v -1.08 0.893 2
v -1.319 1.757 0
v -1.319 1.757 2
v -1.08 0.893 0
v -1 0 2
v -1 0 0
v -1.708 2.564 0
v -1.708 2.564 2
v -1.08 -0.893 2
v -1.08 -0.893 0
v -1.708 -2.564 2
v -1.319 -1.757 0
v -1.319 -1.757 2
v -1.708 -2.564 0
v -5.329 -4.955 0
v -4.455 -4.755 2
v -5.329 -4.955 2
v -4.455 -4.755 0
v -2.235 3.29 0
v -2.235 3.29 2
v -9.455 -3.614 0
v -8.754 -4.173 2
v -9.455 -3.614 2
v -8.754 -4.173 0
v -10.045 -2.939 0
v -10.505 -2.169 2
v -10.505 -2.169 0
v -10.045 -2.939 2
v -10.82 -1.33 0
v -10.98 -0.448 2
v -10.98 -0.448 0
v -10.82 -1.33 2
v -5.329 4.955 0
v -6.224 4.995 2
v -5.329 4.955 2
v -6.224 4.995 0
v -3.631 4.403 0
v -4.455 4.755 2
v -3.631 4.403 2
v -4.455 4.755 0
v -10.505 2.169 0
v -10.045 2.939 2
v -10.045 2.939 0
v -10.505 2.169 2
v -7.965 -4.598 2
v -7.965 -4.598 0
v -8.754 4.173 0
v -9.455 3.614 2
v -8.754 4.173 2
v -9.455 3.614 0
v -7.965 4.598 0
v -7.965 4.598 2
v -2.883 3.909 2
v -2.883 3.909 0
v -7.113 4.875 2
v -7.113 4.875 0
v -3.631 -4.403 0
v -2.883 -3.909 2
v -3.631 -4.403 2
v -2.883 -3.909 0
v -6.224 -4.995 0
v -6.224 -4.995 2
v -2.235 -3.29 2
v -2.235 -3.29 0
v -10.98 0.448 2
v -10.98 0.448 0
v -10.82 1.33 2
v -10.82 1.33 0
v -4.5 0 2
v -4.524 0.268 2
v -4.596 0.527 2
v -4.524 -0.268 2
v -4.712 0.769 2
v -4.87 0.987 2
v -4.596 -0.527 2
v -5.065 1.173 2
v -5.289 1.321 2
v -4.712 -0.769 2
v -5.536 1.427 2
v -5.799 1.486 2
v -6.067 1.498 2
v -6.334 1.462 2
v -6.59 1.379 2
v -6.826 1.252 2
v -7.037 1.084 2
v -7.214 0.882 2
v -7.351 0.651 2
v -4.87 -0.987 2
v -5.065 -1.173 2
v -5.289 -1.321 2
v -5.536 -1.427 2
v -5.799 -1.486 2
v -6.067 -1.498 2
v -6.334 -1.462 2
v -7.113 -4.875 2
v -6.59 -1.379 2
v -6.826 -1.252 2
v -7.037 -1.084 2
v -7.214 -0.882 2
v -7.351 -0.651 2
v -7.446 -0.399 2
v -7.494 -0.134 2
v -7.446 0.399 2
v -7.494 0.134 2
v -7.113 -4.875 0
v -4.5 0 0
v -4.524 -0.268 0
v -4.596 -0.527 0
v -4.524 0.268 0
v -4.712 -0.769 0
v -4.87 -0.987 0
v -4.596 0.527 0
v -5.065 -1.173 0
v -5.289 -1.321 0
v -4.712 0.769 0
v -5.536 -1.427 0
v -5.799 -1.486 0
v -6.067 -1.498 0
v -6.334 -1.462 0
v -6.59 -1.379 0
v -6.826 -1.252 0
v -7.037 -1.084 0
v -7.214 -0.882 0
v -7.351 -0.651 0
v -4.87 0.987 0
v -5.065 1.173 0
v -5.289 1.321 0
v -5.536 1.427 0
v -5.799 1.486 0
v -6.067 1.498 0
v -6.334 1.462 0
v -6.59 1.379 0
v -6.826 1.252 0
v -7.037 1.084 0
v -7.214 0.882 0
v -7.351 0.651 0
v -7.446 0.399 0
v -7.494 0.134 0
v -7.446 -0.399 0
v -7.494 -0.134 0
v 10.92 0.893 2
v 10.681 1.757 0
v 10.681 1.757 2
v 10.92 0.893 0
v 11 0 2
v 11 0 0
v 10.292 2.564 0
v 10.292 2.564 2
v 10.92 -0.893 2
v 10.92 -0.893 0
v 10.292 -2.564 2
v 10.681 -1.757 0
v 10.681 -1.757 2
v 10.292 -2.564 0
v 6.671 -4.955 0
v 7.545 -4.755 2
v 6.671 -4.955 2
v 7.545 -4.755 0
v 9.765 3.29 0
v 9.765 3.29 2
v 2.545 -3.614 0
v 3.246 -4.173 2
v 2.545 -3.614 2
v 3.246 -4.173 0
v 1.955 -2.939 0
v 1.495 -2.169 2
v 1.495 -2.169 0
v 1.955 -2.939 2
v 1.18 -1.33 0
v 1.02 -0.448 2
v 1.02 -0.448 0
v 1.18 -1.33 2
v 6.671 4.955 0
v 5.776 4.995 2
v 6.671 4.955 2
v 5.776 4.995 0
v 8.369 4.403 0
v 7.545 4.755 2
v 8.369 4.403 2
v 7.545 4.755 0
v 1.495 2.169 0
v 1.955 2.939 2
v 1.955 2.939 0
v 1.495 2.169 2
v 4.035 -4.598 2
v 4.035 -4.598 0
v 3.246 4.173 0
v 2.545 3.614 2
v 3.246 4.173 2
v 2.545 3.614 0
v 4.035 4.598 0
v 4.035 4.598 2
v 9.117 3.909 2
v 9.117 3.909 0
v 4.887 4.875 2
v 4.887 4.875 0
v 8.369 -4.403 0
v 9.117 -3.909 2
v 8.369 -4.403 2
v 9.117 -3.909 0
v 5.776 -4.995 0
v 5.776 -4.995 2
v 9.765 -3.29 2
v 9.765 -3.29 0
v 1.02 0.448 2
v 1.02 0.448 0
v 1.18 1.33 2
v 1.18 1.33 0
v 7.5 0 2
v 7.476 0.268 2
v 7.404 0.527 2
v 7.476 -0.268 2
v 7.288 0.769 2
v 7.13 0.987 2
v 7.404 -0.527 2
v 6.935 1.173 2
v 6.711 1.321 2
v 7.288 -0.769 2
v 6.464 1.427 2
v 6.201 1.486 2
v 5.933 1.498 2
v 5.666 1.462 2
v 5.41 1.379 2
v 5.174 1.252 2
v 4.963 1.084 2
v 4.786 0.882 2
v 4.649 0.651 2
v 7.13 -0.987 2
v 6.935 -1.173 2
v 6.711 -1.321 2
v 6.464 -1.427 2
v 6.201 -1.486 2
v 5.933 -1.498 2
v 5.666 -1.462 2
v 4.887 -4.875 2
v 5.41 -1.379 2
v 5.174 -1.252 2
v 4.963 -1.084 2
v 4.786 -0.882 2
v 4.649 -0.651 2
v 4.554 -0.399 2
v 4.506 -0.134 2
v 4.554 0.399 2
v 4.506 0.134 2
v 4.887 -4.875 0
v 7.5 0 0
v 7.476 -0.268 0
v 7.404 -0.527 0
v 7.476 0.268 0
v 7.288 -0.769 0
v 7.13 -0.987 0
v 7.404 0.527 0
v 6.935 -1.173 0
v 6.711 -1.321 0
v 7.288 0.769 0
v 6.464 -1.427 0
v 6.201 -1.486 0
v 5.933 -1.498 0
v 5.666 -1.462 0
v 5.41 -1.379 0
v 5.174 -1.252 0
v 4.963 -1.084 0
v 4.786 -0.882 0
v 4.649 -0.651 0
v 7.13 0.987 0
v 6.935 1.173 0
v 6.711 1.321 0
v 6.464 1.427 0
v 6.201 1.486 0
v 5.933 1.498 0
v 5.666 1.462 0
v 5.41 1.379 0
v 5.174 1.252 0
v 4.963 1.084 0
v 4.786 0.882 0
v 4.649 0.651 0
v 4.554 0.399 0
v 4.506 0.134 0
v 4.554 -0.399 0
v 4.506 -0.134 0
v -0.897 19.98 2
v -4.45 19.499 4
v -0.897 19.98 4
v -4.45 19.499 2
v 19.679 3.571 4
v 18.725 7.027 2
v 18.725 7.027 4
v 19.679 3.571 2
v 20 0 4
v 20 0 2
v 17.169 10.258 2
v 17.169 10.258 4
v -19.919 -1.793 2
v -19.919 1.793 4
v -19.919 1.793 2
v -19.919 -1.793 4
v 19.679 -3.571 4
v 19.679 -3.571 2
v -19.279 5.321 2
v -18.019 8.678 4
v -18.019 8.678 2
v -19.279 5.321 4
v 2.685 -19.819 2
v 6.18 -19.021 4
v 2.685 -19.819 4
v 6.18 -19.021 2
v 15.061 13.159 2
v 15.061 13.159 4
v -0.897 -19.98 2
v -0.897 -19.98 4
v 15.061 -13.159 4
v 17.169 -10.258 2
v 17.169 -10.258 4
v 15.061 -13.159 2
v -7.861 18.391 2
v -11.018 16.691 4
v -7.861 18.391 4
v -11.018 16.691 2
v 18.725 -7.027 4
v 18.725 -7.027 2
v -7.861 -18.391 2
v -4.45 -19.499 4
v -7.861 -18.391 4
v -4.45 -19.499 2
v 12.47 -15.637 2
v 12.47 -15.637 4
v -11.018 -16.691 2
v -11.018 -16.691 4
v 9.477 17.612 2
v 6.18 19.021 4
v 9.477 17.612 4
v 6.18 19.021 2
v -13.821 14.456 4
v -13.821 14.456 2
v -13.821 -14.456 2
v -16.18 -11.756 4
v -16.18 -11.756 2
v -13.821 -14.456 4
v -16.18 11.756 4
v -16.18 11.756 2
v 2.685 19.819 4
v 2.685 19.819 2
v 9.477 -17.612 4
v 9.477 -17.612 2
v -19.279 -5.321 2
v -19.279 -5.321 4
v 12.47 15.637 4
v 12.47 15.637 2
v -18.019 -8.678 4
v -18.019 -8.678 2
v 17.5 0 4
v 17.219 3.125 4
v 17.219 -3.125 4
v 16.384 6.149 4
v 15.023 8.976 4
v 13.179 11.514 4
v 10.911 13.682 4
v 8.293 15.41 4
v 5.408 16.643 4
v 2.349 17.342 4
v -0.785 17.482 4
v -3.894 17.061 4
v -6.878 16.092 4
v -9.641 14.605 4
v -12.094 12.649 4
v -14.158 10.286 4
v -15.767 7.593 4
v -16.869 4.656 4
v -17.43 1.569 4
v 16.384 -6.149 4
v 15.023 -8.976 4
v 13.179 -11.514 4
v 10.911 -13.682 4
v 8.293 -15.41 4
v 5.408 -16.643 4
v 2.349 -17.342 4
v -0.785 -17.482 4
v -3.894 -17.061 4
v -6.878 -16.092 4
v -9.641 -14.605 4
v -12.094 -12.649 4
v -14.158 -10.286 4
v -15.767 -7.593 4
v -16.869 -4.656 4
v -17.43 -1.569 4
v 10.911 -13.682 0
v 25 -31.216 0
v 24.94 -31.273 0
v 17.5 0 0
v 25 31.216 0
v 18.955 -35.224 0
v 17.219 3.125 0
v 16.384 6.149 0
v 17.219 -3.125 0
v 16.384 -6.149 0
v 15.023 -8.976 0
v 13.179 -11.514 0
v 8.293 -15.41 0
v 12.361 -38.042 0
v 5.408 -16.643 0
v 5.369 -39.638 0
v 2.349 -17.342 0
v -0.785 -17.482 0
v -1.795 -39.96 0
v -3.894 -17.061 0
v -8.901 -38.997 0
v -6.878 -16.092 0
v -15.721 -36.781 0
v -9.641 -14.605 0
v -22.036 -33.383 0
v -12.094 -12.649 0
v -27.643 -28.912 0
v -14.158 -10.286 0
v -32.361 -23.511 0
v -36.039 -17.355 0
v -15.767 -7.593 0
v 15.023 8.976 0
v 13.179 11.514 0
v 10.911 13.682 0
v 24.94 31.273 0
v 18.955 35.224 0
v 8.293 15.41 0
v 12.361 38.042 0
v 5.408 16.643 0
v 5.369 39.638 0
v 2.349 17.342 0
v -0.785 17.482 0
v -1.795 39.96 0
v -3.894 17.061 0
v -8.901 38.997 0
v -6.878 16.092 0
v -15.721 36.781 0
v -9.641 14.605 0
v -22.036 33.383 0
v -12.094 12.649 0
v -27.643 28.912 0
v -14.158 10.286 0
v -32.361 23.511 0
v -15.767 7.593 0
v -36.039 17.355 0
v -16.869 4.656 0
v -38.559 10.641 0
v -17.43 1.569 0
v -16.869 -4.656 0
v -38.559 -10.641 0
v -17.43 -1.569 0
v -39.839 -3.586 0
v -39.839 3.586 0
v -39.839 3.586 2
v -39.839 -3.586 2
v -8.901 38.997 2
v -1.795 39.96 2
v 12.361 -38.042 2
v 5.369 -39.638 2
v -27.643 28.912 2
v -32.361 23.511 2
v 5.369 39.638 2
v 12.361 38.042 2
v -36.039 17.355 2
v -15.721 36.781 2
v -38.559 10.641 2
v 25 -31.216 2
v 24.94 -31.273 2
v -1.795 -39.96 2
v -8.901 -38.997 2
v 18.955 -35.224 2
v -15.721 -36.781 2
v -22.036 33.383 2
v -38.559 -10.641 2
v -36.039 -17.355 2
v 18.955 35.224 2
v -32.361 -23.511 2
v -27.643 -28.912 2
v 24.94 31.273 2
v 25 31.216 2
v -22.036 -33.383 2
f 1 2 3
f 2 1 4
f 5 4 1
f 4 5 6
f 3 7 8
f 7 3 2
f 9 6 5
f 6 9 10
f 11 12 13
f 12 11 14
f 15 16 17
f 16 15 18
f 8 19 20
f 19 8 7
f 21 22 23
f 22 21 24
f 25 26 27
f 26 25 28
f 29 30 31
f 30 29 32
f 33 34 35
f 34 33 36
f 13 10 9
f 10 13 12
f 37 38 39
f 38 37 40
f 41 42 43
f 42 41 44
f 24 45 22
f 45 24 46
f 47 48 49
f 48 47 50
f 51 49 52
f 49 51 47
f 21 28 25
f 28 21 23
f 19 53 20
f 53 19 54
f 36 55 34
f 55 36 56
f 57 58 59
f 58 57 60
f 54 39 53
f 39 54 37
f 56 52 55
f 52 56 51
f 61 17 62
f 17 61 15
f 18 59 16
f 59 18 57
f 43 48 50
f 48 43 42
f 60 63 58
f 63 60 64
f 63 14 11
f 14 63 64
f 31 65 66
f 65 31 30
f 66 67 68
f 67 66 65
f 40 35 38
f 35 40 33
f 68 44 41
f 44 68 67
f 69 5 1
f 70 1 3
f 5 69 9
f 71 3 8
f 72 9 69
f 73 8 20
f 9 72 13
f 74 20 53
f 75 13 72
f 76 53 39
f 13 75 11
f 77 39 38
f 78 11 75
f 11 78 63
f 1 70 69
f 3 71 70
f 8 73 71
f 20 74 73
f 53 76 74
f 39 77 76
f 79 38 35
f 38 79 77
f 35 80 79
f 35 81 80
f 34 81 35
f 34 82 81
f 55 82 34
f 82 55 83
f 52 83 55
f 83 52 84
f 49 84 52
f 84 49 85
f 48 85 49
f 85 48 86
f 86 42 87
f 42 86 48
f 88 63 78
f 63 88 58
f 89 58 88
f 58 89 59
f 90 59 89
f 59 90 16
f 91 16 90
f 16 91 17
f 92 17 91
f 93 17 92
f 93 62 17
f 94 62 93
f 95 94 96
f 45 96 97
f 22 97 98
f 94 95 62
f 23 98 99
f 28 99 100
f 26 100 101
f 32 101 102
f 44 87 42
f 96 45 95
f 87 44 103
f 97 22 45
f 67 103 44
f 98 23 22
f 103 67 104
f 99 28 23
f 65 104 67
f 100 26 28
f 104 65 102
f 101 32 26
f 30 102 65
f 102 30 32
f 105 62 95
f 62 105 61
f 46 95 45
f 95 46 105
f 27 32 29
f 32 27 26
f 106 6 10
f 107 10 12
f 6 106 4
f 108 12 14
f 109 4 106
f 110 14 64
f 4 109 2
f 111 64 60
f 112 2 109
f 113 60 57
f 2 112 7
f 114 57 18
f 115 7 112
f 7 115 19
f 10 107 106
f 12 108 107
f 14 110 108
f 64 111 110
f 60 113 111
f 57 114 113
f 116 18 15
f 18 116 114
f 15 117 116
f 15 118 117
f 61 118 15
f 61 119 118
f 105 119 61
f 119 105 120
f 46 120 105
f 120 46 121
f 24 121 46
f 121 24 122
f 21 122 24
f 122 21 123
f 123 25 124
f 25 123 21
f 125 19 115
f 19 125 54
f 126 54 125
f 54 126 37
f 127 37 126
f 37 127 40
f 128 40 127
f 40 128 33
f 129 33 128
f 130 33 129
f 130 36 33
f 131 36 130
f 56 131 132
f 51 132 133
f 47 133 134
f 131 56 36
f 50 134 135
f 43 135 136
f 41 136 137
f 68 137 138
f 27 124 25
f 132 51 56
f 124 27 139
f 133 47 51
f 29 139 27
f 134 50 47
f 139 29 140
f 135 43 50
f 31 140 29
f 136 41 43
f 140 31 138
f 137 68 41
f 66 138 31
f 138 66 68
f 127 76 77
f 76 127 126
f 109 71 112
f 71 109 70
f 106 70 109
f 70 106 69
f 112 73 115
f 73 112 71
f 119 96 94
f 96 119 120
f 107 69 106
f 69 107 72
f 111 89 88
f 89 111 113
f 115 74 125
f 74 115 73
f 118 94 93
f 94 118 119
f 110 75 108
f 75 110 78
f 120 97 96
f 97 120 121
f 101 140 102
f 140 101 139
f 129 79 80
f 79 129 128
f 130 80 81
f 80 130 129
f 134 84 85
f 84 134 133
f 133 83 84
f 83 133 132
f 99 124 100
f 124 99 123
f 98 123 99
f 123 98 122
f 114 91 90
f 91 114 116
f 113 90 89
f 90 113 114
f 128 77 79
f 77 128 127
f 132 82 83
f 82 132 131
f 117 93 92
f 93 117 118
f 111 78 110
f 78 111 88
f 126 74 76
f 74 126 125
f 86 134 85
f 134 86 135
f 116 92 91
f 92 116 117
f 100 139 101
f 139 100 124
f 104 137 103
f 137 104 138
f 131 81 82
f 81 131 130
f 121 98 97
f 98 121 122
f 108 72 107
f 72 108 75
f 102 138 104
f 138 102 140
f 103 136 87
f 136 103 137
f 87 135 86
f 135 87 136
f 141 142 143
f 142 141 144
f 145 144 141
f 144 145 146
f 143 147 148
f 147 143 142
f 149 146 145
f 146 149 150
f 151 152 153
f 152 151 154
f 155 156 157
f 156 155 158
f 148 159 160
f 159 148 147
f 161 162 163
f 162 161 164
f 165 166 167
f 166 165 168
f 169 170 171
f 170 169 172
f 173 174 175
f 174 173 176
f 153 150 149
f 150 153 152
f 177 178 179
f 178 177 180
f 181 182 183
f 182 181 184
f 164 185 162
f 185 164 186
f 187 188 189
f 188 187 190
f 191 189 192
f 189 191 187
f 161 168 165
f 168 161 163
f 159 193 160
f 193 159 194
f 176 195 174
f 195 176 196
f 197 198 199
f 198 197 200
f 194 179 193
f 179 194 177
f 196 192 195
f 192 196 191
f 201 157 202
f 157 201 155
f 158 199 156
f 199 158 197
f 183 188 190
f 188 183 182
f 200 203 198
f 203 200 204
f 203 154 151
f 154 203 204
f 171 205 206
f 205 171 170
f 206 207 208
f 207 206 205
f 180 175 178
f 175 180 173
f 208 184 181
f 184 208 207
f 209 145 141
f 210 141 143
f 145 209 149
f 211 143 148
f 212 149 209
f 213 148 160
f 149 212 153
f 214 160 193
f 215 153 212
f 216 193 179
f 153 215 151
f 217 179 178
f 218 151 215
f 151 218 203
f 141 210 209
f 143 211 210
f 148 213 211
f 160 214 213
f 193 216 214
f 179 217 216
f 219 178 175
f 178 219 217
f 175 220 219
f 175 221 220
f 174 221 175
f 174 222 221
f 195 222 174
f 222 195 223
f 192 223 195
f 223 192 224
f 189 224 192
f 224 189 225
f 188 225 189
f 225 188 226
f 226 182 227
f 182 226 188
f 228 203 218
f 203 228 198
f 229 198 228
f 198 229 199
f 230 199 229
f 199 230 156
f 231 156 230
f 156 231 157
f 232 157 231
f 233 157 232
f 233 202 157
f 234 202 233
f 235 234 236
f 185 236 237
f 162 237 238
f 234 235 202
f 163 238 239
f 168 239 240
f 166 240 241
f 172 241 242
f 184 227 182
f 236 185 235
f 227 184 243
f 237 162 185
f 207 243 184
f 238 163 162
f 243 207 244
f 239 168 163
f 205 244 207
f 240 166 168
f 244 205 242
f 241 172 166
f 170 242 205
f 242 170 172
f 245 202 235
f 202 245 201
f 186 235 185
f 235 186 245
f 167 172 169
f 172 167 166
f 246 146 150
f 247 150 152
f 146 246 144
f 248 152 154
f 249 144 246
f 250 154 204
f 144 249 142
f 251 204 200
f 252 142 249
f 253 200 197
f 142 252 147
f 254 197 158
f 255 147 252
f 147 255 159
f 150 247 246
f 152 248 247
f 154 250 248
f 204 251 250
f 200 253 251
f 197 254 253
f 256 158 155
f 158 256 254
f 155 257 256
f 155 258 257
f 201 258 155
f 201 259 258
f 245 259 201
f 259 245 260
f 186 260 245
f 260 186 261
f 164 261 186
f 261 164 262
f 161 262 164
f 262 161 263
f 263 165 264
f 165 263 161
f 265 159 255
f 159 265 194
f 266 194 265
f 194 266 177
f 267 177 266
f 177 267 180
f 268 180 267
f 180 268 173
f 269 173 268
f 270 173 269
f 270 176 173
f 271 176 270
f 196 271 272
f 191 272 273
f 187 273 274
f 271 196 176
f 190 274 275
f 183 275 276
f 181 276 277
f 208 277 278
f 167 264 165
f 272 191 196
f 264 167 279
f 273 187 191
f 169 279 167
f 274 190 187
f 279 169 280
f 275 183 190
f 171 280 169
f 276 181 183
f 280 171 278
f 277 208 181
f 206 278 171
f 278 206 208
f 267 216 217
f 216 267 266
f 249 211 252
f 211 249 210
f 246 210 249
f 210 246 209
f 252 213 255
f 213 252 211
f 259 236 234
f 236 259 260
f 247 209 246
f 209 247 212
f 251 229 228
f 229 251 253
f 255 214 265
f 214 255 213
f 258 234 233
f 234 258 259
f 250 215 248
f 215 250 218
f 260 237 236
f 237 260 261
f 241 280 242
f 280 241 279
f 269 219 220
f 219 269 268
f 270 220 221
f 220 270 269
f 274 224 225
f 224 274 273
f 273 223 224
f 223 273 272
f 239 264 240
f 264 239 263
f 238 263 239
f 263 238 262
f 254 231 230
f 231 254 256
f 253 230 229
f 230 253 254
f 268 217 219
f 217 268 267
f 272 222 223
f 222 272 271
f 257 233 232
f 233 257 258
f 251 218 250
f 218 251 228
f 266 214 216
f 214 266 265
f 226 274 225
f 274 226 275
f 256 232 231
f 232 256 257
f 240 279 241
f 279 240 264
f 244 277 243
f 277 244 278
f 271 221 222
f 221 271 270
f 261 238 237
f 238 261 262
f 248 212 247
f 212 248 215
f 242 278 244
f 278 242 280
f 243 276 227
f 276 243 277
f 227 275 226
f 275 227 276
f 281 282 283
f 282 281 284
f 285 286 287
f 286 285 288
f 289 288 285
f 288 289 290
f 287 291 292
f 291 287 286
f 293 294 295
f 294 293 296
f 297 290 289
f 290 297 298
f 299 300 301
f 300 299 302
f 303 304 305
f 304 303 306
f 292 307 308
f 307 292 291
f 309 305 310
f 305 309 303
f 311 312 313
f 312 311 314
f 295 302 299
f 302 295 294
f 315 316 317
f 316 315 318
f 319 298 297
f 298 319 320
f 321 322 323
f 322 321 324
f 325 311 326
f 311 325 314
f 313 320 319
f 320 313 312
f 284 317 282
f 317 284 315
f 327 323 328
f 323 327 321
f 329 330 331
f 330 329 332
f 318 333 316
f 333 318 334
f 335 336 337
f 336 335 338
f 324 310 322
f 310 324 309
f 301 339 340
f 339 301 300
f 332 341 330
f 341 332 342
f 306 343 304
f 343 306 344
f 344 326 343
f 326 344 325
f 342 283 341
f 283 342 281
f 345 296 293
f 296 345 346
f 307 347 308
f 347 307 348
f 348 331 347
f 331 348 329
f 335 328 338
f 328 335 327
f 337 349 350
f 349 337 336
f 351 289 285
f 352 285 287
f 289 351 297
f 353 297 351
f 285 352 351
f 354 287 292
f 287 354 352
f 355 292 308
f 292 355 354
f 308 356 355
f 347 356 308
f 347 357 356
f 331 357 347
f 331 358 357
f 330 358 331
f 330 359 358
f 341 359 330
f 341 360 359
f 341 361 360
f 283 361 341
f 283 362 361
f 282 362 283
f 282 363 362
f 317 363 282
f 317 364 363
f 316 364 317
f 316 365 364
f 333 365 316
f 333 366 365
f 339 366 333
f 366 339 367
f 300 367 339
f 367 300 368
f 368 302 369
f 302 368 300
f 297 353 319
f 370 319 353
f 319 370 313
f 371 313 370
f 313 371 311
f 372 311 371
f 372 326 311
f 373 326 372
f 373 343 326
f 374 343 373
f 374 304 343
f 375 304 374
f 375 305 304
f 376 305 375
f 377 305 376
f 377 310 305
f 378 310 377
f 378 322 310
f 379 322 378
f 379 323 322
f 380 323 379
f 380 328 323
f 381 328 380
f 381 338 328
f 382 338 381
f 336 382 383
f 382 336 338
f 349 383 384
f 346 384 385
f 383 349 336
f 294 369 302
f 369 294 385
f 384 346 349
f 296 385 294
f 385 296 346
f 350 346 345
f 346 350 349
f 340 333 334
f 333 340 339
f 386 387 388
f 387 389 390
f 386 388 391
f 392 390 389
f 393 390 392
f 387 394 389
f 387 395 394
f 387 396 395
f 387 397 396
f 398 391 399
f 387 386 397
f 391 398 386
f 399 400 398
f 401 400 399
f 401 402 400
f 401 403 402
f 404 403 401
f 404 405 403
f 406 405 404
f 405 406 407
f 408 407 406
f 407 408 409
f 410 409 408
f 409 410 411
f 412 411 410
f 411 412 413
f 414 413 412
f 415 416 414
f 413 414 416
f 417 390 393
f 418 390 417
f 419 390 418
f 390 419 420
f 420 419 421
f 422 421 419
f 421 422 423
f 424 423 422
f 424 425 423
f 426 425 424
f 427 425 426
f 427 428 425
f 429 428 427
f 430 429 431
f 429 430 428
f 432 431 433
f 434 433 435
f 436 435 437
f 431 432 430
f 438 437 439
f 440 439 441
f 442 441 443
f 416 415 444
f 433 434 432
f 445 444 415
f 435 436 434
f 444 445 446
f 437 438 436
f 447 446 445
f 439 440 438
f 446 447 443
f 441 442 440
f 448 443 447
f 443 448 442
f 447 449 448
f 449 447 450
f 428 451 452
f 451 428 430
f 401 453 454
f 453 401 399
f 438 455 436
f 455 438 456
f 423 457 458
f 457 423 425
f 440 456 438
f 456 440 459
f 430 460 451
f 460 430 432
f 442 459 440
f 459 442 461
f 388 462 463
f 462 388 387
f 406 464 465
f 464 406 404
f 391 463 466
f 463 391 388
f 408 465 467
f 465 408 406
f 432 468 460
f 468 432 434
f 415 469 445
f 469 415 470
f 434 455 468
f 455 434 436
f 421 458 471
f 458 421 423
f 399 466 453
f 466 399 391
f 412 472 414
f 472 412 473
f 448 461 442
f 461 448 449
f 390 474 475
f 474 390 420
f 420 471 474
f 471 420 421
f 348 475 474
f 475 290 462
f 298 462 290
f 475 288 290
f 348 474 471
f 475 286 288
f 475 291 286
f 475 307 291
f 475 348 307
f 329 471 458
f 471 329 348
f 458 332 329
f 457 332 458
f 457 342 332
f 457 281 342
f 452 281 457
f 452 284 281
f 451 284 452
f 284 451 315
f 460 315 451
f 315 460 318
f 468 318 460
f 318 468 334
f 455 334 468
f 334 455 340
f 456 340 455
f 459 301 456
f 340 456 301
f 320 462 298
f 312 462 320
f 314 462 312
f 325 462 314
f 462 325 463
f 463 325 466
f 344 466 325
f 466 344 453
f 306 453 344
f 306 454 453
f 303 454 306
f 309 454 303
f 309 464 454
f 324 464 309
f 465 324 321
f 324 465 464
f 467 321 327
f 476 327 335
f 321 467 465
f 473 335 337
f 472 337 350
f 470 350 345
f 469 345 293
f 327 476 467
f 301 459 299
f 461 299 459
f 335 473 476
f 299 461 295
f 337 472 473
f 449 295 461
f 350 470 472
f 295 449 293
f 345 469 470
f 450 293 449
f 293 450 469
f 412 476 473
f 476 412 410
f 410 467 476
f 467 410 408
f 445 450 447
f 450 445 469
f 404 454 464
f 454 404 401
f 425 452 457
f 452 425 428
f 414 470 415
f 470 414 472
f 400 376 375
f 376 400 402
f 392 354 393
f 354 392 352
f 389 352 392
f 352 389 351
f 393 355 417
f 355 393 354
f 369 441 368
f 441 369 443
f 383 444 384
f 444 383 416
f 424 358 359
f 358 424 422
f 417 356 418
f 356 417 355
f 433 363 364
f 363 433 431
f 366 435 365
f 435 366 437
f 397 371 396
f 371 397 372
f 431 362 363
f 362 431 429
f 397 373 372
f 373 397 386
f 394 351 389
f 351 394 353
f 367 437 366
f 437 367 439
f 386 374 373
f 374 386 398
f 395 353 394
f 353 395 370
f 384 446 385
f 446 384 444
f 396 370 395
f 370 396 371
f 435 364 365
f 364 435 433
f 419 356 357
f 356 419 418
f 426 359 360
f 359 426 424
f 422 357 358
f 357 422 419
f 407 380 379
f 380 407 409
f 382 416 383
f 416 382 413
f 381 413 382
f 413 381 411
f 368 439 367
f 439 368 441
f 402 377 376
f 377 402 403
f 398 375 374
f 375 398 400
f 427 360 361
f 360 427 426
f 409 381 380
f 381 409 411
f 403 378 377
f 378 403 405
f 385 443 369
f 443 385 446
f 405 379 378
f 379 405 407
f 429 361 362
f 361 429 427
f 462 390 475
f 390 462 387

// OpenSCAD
// file: ringlib.scad
module sleeve(od,id,h) {
  difference() {
   cylinder(r=od/2,h=h);
   cylinder(r=id/2,h=h);
  }
}

module halfdome(dia,thick) {
   difference() {
     sphere(r=dia/2);
     sphere(r=(dia-2*thick)/2);
     translate([-dia/2,-dia/2,-dia]) cube([dia,dia,dia]);
   }
}

module suspendedring(od,id,h,outside) {
  w = (od-id)/2;
  points_outside=[[0,h],[-w,h],[-w,w],[0,0]];
  points_inside=[[0,h],[-w,h],[-w,0],[0,w]];
  if(outside) {
    rotate_extrude() translate([od/2,0,0]) polygon(points_outside);
  } else {
    rotate_extrude() translate([od/2,0,0]) polygon(points_inside);
  }
}

module circleplate(r,t,w,h,wo,ho) {
  difference() {
   translate([wo,ho,0])cube([w,h,t]);
   difference() { cylinder(r=r+50,h);cylinder(r=r,h);}
  }
}

module support(width,depth,height, hashole) {
  points=[[0,height],[-depth,height],[-depth,depth],[0,0]];
  if(hashole) {
    difference() {
      rotate([90,0,0]) linear_extrude(height=width) polygon(points);
      translate([-width/2,-depth/2,3]) cylinder(r=1,h=height);
    }
  } else {
    rotate([90,0,0]) linear_extrude(height=width) polygon(points);
  }
}
module connectionring(dia,thick,height,lap){
  translate([0,0,lap-2]) {
    translate([0,0,height-4]) suspendedring(dia+2*thick,dia,lap+2,false);
    suspendedring(dia+.01,dia-2*thick,height,true);
    translate([0,0,4]) rotate([0,180,0]) suspendedring(dia+2*thick,dia,lap+2,false);
  }
}
module washer(out,in,thick) {
  difference() {
    cylinder(r=out/2,h=thick,center=true);
    cylinder(r=in/2,h=thick+.1,center=true);
  }
}

module testringlib(){
  suspendedring(124,120,5,false);
  translate([0,0,-10]) sleeve(124,120,5);
  translate([0,0,10]) halfdome(124,2.5);
  translate([0,0,-60]) connectionring(124,2,12,5, $fa=5);
  washer(10,3,1.5);
}

//testringlib();
// main file
include  <ringlib.scad>
translate([-6,0,1]) washer(10,3,2,$fn=35);
translate([6,0,1]) washer(10,3,2,$fn=35);

$fn=35;
difference() {
  union() {
   cylinder(r=20,h=4);
   cylinder(r=40,h=2);
  }
  translate([0,0,-1]) cylinder(r=17.5,h=6);
  translate([25,-50,-1]) cube([20,100,4]);
}
